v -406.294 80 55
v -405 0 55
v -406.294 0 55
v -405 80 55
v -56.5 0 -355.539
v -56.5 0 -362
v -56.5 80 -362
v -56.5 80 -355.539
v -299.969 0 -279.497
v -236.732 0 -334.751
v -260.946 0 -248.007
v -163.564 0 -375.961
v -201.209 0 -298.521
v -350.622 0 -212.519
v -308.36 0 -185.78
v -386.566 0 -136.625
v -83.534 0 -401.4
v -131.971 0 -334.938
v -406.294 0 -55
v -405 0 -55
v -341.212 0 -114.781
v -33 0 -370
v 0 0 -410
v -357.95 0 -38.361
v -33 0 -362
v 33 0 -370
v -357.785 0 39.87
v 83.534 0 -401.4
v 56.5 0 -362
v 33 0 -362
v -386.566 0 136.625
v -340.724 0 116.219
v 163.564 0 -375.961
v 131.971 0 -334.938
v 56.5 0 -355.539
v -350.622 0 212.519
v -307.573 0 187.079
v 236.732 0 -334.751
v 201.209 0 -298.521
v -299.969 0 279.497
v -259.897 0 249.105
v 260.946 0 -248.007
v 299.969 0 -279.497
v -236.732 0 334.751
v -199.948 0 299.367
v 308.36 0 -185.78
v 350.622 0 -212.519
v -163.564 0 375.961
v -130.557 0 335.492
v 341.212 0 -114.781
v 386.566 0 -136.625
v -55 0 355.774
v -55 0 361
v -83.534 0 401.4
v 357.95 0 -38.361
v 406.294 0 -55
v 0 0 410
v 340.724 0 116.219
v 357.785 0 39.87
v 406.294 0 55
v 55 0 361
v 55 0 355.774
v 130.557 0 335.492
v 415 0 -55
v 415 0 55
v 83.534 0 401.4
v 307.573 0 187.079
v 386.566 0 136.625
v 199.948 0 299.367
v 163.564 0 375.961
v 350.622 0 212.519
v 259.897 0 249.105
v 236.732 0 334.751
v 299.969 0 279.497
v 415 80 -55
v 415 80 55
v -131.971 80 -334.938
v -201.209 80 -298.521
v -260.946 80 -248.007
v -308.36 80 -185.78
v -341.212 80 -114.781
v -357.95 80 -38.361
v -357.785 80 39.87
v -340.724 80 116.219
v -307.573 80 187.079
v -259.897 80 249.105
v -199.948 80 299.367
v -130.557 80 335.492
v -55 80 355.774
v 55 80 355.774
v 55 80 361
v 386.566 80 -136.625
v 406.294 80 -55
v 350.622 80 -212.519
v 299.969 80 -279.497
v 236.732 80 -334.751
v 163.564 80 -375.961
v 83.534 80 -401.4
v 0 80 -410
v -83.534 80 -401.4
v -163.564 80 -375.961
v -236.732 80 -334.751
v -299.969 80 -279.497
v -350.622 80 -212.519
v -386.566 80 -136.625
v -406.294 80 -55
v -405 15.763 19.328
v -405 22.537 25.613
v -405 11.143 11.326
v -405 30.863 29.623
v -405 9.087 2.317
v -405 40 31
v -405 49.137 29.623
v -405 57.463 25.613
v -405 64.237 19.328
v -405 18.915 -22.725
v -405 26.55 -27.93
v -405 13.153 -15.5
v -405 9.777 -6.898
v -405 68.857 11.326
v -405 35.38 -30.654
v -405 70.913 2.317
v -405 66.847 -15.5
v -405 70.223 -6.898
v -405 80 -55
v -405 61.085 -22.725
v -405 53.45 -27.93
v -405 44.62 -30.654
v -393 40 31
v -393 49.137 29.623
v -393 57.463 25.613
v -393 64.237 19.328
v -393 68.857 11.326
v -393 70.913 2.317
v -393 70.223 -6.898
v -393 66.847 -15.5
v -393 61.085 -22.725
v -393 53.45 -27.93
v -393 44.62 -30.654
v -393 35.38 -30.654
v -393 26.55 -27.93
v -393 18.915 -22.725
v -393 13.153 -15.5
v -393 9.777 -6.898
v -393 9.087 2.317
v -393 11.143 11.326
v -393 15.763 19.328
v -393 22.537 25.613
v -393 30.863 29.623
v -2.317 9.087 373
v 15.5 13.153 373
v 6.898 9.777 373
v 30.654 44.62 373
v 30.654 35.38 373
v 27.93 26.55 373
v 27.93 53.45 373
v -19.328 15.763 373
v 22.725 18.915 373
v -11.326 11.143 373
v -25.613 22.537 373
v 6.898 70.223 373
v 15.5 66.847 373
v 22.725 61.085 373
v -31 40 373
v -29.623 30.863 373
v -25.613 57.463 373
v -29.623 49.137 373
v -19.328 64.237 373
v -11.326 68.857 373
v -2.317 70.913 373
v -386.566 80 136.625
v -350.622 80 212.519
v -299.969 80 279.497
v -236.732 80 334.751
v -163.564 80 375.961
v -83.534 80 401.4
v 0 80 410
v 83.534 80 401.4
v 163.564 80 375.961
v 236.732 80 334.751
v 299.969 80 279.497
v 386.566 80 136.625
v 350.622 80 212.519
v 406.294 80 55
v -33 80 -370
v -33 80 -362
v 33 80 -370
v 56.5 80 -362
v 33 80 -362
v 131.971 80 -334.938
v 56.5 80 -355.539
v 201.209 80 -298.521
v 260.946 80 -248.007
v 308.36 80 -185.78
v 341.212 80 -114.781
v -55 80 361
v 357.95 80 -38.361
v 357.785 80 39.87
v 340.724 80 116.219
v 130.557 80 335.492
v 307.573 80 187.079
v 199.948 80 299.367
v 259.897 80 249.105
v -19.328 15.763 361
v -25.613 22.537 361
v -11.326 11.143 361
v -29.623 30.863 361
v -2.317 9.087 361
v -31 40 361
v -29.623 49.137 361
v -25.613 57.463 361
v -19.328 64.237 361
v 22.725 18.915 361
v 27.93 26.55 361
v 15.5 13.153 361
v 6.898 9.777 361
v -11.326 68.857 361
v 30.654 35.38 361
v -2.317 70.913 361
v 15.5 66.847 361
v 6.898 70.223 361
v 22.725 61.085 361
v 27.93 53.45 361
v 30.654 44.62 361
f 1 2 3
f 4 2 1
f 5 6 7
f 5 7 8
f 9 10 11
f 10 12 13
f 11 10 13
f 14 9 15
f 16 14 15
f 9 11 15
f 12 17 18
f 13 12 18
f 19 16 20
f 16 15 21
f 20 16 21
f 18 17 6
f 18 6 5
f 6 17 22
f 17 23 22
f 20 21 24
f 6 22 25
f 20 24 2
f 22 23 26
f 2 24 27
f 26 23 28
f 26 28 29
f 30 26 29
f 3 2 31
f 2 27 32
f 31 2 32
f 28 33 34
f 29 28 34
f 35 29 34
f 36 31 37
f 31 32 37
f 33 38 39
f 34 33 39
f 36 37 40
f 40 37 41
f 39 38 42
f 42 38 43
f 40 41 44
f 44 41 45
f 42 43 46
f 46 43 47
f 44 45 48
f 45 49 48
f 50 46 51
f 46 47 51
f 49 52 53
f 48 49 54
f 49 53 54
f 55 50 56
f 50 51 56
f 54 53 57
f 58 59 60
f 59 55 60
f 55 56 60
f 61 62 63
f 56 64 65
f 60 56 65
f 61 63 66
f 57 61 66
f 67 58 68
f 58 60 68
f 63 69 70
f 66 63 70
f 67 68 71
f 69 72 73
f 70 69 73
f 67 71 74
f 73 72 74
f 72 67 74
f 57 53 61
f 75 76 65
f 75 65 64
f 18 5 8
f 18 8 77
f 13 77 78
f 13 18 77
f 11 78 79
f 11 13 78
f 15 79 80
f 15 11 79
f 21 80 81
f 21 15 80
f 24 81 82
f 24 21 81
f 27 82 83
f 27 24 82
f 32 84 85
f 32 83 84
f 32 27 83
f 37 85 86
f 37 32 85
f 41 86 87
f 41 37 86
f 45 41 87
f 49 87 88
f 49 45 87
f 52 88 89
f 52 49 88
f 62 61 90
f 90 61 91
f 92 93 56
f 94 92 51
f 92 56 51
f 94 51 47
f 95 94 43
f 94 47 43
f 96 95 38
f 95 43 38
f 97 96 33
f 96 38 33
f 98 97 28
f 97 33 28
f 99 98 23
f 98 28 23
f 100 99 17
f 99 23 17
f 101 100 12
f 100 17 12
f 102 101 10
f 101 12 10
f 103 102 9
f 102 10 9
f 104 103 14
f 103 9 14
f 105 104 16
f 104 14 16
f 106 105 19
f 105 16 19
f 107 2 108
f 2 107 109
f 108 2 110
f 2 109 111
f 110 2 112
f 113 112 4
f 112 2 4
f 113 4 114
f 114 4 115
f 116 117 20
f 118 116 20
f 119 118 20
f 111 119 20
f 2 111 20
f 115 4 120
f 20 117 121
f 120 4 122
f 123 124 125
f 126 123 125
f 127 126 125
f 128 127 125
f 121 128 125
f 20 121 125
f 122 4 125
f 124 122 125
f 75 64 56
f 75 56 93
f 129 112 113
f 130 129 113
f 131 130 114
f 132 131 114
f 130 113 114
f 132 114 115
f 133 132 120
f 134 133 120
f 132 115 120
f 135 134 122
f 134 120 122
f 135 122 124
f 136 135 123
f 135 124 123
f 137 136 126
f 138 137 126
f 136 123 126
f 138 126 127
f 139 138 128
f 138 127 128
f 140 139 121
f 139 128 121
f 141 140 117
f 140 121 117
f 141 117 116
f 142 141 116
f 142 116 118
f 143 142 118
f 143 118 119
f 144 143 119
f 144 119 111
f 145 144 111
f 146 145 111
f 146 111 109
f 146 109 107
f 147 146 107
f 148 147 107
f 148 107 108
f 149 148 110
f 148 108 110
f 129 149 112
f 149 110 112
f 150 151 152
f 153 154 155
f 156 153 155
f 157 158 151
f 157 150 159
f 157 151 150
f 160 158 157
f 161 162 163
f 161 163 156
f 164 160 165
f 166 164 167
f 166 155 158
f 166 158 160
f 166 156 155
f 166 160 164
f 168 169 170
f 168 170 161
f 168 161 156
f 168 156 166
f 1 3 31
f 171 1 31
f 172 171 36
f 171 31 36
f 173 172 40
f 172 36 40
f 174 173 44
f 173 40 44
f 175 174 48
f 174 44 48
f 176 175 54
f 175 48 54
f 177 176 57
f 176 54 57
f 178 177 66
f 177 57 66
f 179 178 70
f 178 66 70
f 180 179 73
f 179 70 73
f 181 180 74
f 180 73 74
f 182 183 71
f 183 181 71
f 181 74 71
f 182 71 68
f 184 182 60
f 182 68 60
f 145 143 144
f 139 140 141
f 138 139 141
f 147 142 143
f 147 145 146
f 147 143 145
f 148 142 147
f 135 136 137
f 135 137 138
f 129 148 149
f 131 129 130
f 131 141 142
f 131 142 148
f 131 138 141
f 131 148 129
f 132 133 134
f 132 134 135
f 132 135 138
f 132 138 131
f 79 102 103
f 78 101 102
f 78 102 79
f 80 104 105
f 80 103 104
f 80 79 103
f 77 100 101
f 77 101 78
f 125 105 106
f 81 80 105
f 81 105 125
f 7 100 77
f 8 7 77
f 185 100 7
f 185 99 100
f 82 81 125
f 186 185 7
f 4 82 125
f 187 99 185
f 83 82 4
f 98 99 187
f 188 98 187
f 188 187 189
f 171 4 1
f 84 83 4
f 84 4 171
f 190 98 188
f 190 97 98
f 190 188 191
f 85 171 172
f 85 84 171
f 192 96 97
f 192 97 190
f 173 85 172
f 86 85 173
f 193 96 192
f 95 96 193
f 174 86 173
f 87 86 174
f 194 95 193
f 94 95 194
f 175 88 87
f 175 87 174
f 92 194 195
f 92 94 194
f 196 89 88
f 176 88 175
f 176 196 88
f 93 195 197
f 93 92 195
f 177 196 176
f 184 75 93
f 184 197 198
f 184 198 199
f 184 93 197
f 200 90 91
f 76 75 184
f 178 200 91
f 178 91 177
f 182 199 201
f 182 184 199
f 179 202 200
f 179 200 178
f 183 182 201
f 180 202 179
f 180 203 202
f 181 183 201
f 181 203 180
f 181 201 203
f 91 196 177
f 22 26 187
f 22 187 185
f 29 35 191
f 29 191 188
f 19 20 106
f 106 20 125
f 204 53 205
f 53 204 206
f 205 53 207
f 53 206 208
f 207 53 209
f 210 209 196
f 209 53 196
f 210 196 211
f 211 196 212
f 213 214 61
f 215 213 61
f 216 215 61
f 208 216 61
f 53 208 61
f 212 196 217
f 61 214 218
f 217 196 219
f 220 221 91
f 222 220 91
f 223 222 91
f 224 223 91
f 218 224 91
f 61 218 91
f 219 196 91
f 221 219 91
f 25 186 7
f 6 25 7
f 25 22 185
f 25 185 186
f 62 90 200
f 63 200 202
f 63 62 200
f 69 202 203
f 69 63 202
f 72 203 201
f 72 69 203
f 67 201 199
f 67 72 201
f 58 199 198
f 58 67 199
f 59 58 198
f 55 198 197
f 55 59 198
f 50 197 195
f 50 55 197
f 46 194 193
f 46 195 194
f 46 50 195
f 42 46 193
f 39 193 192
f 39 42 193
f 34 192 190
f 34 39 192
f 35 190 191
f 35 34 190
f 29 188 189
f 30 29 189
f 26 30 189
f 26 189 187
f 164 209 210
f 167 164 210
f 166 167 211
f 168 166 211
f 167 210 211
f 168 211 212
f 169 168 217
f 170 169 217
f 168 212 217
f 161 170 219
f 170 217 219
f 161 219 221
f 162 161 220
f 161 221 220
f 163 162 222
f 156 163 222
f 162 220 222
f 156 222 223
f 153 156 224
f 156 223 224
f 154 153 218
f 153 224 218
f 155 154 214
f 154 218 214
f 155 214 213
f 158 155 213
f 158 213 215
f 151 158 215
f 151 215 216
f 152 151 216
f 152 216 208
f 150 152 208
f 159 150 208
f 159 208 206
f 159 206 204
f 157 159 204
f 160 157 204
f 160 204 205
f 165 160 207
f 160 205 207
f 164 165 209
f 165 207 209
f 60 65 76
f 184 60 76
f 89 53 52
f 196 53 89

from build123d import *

# Parameters (mm, degrees)
SKETCH1_R                = 410
SKETCH1_R_2              = 360
BOSS_EXTRUDE1_DEPTH      = 80
CUT_EXTRUDE2_DEPTH       = 586.320425066
CUT_EXTRUDE2_DEPTH_BACK  = 586.320425066
SKETCH5_W                = 110
SKETCH5_H                = 80
CUT_EXTRUDE3_DEPTH       = 30
SKETCH6_R                = 31
CUT_EXTRUDE4_DEPTH       = 12
BOSS_EXTRUDE2_REACH      = 926.73
BOSS_EXTRUDE2_END_RADIUS = 410
SKETCH7_W                = 110
SKETCH7_H                = 80
SKETCH9_W                = 110
SKETCH9_H                = 80
CUT_EXTRUDE5_DEPTH       = 41.7
SKETCH10_R               = 31
CUT_EXTRUDE6_DEPTH       = 12


with BuildPart() as part:
    # Sketch1 → Boss-Extrude1 (new body)
    with BuildSketch(Plane(origin=(0, 0, 0), x_dir=(1, 0, 0), z_dir=(0, 1, 0))):
        with Locations(Location((0, 0, 0), (0, 0, 270))):
            Circle(SKETCH1_R)
        with Locations(Location((0, 0, 0), (0, 0, 270))):
            Circle(SKETCH1_R_2, mode=Mode.SUBTRACT)
    extrude(amount=BOSS_EXTRUDE1_DEPTH)

    # Sketch3 → Cut-Extrude2 (cut, two sides: drawn at the far end of the back side and taken through both)
    with BuildSketch(Plane(origin=(0, 80, 0), x_dir=(1, 0, 0), z_dir=(0, 1, 0)).offset(-CUT_EXTRUDE2_DEPTH_BACK)):
        Polygon((-56.5, 287.02643749), (56.5, 287.02643749), (56.5, 362), (33, 362), (33, 370), (-33, 370), (-33, 362), (-56.5, 362), align=None)
    extrude(amount=CUT_EXTRUDE2_DEPTH + CUT_EXTRUDE2_DEPTH_BACK, mode=Mode.SUBTRACT)

    # Sketch5 → Cut-Extrude3 (cut)
    with BuildSketch(Plane.XY.offset(361)):
        with Locations((0, 40)):
            Rectangle(SKETCH5_W, SKETCH5_H)
    extrude(amount=-CUT_EXTRUDE3_DEPTH, mode=Mode.SUBTRACT)

    # Sketch6 → Cut-Extrude4 (cut)
    with BuildSketch(Plane(origin=(0, 0, 361), x_dir=(-1, 0, 0), z_dir=(0, 0, -1))):
        with Locations((0, 40)):
            Circle(SKETCH6_R)
    extrude(amount=-CUT_EXTRUDE4_DEPTH, mode=Mode.SUBTRACT)

    # Boss-Extrude2: up to this cylinder (the profile starts outside it)
    boss_extrude2_end = Plane(origin=(0, 40, 0), z_dir=(0, -1, 0)) * Cylinder(BOSS_EXTRUDE2_END_RADIUS, 2674.46, mode=Mode.PRIVATE)
    # Sketch7 → Boss-Extrude2 (add, up to the surface)
    with BuildSketch(Plane(origin=(415, 0, 0), x_dir=(0, 0, -1), z_dir=(1, 0, 0)), mode=Mode.PRIVATE) as boss_extrude2_sk1:
        with Locations((0, 40)):
            Rectangle(SKETCH7_W, SKETCH7_H)
    boss_extrude2_tool1 = extrude(boss_extrude2_sk1.sketch, amount=-BOSS_EXTRUDE2_REACH, mode=Mode.PRIVATE) - boss_extrude2_end
    add(boss_extrude2_tool1.solids().sort_by_distance((415, 40, 0))[0])

    # Sketch9 → Cut-Extrude5 (cut)
    with BuildSketch(Plane(origin=(-405, 0, 0), x_dir=(0, 0, -1), z_dir=(1, 0, 0))):
        with Locations((0, 40)):
            Rectangle(SKETCH9_W, SKETCH9_H)
    extrude(amount=-CUT_EXTRUDE5_DEPTH, mode=Mode.SUBTRACT)

    # Sketch10 → Cut-Extrude6 (cut)
    with BuildSketch(Plane.ZY.offset(405)):
        with Locations((0, 40)):
            Circle(SKETCH10_R)
    extrude(amount=-CUT_EXTRUDE6_DEPTH, mode=Mode.SUBTRACT)


solid = part.part
